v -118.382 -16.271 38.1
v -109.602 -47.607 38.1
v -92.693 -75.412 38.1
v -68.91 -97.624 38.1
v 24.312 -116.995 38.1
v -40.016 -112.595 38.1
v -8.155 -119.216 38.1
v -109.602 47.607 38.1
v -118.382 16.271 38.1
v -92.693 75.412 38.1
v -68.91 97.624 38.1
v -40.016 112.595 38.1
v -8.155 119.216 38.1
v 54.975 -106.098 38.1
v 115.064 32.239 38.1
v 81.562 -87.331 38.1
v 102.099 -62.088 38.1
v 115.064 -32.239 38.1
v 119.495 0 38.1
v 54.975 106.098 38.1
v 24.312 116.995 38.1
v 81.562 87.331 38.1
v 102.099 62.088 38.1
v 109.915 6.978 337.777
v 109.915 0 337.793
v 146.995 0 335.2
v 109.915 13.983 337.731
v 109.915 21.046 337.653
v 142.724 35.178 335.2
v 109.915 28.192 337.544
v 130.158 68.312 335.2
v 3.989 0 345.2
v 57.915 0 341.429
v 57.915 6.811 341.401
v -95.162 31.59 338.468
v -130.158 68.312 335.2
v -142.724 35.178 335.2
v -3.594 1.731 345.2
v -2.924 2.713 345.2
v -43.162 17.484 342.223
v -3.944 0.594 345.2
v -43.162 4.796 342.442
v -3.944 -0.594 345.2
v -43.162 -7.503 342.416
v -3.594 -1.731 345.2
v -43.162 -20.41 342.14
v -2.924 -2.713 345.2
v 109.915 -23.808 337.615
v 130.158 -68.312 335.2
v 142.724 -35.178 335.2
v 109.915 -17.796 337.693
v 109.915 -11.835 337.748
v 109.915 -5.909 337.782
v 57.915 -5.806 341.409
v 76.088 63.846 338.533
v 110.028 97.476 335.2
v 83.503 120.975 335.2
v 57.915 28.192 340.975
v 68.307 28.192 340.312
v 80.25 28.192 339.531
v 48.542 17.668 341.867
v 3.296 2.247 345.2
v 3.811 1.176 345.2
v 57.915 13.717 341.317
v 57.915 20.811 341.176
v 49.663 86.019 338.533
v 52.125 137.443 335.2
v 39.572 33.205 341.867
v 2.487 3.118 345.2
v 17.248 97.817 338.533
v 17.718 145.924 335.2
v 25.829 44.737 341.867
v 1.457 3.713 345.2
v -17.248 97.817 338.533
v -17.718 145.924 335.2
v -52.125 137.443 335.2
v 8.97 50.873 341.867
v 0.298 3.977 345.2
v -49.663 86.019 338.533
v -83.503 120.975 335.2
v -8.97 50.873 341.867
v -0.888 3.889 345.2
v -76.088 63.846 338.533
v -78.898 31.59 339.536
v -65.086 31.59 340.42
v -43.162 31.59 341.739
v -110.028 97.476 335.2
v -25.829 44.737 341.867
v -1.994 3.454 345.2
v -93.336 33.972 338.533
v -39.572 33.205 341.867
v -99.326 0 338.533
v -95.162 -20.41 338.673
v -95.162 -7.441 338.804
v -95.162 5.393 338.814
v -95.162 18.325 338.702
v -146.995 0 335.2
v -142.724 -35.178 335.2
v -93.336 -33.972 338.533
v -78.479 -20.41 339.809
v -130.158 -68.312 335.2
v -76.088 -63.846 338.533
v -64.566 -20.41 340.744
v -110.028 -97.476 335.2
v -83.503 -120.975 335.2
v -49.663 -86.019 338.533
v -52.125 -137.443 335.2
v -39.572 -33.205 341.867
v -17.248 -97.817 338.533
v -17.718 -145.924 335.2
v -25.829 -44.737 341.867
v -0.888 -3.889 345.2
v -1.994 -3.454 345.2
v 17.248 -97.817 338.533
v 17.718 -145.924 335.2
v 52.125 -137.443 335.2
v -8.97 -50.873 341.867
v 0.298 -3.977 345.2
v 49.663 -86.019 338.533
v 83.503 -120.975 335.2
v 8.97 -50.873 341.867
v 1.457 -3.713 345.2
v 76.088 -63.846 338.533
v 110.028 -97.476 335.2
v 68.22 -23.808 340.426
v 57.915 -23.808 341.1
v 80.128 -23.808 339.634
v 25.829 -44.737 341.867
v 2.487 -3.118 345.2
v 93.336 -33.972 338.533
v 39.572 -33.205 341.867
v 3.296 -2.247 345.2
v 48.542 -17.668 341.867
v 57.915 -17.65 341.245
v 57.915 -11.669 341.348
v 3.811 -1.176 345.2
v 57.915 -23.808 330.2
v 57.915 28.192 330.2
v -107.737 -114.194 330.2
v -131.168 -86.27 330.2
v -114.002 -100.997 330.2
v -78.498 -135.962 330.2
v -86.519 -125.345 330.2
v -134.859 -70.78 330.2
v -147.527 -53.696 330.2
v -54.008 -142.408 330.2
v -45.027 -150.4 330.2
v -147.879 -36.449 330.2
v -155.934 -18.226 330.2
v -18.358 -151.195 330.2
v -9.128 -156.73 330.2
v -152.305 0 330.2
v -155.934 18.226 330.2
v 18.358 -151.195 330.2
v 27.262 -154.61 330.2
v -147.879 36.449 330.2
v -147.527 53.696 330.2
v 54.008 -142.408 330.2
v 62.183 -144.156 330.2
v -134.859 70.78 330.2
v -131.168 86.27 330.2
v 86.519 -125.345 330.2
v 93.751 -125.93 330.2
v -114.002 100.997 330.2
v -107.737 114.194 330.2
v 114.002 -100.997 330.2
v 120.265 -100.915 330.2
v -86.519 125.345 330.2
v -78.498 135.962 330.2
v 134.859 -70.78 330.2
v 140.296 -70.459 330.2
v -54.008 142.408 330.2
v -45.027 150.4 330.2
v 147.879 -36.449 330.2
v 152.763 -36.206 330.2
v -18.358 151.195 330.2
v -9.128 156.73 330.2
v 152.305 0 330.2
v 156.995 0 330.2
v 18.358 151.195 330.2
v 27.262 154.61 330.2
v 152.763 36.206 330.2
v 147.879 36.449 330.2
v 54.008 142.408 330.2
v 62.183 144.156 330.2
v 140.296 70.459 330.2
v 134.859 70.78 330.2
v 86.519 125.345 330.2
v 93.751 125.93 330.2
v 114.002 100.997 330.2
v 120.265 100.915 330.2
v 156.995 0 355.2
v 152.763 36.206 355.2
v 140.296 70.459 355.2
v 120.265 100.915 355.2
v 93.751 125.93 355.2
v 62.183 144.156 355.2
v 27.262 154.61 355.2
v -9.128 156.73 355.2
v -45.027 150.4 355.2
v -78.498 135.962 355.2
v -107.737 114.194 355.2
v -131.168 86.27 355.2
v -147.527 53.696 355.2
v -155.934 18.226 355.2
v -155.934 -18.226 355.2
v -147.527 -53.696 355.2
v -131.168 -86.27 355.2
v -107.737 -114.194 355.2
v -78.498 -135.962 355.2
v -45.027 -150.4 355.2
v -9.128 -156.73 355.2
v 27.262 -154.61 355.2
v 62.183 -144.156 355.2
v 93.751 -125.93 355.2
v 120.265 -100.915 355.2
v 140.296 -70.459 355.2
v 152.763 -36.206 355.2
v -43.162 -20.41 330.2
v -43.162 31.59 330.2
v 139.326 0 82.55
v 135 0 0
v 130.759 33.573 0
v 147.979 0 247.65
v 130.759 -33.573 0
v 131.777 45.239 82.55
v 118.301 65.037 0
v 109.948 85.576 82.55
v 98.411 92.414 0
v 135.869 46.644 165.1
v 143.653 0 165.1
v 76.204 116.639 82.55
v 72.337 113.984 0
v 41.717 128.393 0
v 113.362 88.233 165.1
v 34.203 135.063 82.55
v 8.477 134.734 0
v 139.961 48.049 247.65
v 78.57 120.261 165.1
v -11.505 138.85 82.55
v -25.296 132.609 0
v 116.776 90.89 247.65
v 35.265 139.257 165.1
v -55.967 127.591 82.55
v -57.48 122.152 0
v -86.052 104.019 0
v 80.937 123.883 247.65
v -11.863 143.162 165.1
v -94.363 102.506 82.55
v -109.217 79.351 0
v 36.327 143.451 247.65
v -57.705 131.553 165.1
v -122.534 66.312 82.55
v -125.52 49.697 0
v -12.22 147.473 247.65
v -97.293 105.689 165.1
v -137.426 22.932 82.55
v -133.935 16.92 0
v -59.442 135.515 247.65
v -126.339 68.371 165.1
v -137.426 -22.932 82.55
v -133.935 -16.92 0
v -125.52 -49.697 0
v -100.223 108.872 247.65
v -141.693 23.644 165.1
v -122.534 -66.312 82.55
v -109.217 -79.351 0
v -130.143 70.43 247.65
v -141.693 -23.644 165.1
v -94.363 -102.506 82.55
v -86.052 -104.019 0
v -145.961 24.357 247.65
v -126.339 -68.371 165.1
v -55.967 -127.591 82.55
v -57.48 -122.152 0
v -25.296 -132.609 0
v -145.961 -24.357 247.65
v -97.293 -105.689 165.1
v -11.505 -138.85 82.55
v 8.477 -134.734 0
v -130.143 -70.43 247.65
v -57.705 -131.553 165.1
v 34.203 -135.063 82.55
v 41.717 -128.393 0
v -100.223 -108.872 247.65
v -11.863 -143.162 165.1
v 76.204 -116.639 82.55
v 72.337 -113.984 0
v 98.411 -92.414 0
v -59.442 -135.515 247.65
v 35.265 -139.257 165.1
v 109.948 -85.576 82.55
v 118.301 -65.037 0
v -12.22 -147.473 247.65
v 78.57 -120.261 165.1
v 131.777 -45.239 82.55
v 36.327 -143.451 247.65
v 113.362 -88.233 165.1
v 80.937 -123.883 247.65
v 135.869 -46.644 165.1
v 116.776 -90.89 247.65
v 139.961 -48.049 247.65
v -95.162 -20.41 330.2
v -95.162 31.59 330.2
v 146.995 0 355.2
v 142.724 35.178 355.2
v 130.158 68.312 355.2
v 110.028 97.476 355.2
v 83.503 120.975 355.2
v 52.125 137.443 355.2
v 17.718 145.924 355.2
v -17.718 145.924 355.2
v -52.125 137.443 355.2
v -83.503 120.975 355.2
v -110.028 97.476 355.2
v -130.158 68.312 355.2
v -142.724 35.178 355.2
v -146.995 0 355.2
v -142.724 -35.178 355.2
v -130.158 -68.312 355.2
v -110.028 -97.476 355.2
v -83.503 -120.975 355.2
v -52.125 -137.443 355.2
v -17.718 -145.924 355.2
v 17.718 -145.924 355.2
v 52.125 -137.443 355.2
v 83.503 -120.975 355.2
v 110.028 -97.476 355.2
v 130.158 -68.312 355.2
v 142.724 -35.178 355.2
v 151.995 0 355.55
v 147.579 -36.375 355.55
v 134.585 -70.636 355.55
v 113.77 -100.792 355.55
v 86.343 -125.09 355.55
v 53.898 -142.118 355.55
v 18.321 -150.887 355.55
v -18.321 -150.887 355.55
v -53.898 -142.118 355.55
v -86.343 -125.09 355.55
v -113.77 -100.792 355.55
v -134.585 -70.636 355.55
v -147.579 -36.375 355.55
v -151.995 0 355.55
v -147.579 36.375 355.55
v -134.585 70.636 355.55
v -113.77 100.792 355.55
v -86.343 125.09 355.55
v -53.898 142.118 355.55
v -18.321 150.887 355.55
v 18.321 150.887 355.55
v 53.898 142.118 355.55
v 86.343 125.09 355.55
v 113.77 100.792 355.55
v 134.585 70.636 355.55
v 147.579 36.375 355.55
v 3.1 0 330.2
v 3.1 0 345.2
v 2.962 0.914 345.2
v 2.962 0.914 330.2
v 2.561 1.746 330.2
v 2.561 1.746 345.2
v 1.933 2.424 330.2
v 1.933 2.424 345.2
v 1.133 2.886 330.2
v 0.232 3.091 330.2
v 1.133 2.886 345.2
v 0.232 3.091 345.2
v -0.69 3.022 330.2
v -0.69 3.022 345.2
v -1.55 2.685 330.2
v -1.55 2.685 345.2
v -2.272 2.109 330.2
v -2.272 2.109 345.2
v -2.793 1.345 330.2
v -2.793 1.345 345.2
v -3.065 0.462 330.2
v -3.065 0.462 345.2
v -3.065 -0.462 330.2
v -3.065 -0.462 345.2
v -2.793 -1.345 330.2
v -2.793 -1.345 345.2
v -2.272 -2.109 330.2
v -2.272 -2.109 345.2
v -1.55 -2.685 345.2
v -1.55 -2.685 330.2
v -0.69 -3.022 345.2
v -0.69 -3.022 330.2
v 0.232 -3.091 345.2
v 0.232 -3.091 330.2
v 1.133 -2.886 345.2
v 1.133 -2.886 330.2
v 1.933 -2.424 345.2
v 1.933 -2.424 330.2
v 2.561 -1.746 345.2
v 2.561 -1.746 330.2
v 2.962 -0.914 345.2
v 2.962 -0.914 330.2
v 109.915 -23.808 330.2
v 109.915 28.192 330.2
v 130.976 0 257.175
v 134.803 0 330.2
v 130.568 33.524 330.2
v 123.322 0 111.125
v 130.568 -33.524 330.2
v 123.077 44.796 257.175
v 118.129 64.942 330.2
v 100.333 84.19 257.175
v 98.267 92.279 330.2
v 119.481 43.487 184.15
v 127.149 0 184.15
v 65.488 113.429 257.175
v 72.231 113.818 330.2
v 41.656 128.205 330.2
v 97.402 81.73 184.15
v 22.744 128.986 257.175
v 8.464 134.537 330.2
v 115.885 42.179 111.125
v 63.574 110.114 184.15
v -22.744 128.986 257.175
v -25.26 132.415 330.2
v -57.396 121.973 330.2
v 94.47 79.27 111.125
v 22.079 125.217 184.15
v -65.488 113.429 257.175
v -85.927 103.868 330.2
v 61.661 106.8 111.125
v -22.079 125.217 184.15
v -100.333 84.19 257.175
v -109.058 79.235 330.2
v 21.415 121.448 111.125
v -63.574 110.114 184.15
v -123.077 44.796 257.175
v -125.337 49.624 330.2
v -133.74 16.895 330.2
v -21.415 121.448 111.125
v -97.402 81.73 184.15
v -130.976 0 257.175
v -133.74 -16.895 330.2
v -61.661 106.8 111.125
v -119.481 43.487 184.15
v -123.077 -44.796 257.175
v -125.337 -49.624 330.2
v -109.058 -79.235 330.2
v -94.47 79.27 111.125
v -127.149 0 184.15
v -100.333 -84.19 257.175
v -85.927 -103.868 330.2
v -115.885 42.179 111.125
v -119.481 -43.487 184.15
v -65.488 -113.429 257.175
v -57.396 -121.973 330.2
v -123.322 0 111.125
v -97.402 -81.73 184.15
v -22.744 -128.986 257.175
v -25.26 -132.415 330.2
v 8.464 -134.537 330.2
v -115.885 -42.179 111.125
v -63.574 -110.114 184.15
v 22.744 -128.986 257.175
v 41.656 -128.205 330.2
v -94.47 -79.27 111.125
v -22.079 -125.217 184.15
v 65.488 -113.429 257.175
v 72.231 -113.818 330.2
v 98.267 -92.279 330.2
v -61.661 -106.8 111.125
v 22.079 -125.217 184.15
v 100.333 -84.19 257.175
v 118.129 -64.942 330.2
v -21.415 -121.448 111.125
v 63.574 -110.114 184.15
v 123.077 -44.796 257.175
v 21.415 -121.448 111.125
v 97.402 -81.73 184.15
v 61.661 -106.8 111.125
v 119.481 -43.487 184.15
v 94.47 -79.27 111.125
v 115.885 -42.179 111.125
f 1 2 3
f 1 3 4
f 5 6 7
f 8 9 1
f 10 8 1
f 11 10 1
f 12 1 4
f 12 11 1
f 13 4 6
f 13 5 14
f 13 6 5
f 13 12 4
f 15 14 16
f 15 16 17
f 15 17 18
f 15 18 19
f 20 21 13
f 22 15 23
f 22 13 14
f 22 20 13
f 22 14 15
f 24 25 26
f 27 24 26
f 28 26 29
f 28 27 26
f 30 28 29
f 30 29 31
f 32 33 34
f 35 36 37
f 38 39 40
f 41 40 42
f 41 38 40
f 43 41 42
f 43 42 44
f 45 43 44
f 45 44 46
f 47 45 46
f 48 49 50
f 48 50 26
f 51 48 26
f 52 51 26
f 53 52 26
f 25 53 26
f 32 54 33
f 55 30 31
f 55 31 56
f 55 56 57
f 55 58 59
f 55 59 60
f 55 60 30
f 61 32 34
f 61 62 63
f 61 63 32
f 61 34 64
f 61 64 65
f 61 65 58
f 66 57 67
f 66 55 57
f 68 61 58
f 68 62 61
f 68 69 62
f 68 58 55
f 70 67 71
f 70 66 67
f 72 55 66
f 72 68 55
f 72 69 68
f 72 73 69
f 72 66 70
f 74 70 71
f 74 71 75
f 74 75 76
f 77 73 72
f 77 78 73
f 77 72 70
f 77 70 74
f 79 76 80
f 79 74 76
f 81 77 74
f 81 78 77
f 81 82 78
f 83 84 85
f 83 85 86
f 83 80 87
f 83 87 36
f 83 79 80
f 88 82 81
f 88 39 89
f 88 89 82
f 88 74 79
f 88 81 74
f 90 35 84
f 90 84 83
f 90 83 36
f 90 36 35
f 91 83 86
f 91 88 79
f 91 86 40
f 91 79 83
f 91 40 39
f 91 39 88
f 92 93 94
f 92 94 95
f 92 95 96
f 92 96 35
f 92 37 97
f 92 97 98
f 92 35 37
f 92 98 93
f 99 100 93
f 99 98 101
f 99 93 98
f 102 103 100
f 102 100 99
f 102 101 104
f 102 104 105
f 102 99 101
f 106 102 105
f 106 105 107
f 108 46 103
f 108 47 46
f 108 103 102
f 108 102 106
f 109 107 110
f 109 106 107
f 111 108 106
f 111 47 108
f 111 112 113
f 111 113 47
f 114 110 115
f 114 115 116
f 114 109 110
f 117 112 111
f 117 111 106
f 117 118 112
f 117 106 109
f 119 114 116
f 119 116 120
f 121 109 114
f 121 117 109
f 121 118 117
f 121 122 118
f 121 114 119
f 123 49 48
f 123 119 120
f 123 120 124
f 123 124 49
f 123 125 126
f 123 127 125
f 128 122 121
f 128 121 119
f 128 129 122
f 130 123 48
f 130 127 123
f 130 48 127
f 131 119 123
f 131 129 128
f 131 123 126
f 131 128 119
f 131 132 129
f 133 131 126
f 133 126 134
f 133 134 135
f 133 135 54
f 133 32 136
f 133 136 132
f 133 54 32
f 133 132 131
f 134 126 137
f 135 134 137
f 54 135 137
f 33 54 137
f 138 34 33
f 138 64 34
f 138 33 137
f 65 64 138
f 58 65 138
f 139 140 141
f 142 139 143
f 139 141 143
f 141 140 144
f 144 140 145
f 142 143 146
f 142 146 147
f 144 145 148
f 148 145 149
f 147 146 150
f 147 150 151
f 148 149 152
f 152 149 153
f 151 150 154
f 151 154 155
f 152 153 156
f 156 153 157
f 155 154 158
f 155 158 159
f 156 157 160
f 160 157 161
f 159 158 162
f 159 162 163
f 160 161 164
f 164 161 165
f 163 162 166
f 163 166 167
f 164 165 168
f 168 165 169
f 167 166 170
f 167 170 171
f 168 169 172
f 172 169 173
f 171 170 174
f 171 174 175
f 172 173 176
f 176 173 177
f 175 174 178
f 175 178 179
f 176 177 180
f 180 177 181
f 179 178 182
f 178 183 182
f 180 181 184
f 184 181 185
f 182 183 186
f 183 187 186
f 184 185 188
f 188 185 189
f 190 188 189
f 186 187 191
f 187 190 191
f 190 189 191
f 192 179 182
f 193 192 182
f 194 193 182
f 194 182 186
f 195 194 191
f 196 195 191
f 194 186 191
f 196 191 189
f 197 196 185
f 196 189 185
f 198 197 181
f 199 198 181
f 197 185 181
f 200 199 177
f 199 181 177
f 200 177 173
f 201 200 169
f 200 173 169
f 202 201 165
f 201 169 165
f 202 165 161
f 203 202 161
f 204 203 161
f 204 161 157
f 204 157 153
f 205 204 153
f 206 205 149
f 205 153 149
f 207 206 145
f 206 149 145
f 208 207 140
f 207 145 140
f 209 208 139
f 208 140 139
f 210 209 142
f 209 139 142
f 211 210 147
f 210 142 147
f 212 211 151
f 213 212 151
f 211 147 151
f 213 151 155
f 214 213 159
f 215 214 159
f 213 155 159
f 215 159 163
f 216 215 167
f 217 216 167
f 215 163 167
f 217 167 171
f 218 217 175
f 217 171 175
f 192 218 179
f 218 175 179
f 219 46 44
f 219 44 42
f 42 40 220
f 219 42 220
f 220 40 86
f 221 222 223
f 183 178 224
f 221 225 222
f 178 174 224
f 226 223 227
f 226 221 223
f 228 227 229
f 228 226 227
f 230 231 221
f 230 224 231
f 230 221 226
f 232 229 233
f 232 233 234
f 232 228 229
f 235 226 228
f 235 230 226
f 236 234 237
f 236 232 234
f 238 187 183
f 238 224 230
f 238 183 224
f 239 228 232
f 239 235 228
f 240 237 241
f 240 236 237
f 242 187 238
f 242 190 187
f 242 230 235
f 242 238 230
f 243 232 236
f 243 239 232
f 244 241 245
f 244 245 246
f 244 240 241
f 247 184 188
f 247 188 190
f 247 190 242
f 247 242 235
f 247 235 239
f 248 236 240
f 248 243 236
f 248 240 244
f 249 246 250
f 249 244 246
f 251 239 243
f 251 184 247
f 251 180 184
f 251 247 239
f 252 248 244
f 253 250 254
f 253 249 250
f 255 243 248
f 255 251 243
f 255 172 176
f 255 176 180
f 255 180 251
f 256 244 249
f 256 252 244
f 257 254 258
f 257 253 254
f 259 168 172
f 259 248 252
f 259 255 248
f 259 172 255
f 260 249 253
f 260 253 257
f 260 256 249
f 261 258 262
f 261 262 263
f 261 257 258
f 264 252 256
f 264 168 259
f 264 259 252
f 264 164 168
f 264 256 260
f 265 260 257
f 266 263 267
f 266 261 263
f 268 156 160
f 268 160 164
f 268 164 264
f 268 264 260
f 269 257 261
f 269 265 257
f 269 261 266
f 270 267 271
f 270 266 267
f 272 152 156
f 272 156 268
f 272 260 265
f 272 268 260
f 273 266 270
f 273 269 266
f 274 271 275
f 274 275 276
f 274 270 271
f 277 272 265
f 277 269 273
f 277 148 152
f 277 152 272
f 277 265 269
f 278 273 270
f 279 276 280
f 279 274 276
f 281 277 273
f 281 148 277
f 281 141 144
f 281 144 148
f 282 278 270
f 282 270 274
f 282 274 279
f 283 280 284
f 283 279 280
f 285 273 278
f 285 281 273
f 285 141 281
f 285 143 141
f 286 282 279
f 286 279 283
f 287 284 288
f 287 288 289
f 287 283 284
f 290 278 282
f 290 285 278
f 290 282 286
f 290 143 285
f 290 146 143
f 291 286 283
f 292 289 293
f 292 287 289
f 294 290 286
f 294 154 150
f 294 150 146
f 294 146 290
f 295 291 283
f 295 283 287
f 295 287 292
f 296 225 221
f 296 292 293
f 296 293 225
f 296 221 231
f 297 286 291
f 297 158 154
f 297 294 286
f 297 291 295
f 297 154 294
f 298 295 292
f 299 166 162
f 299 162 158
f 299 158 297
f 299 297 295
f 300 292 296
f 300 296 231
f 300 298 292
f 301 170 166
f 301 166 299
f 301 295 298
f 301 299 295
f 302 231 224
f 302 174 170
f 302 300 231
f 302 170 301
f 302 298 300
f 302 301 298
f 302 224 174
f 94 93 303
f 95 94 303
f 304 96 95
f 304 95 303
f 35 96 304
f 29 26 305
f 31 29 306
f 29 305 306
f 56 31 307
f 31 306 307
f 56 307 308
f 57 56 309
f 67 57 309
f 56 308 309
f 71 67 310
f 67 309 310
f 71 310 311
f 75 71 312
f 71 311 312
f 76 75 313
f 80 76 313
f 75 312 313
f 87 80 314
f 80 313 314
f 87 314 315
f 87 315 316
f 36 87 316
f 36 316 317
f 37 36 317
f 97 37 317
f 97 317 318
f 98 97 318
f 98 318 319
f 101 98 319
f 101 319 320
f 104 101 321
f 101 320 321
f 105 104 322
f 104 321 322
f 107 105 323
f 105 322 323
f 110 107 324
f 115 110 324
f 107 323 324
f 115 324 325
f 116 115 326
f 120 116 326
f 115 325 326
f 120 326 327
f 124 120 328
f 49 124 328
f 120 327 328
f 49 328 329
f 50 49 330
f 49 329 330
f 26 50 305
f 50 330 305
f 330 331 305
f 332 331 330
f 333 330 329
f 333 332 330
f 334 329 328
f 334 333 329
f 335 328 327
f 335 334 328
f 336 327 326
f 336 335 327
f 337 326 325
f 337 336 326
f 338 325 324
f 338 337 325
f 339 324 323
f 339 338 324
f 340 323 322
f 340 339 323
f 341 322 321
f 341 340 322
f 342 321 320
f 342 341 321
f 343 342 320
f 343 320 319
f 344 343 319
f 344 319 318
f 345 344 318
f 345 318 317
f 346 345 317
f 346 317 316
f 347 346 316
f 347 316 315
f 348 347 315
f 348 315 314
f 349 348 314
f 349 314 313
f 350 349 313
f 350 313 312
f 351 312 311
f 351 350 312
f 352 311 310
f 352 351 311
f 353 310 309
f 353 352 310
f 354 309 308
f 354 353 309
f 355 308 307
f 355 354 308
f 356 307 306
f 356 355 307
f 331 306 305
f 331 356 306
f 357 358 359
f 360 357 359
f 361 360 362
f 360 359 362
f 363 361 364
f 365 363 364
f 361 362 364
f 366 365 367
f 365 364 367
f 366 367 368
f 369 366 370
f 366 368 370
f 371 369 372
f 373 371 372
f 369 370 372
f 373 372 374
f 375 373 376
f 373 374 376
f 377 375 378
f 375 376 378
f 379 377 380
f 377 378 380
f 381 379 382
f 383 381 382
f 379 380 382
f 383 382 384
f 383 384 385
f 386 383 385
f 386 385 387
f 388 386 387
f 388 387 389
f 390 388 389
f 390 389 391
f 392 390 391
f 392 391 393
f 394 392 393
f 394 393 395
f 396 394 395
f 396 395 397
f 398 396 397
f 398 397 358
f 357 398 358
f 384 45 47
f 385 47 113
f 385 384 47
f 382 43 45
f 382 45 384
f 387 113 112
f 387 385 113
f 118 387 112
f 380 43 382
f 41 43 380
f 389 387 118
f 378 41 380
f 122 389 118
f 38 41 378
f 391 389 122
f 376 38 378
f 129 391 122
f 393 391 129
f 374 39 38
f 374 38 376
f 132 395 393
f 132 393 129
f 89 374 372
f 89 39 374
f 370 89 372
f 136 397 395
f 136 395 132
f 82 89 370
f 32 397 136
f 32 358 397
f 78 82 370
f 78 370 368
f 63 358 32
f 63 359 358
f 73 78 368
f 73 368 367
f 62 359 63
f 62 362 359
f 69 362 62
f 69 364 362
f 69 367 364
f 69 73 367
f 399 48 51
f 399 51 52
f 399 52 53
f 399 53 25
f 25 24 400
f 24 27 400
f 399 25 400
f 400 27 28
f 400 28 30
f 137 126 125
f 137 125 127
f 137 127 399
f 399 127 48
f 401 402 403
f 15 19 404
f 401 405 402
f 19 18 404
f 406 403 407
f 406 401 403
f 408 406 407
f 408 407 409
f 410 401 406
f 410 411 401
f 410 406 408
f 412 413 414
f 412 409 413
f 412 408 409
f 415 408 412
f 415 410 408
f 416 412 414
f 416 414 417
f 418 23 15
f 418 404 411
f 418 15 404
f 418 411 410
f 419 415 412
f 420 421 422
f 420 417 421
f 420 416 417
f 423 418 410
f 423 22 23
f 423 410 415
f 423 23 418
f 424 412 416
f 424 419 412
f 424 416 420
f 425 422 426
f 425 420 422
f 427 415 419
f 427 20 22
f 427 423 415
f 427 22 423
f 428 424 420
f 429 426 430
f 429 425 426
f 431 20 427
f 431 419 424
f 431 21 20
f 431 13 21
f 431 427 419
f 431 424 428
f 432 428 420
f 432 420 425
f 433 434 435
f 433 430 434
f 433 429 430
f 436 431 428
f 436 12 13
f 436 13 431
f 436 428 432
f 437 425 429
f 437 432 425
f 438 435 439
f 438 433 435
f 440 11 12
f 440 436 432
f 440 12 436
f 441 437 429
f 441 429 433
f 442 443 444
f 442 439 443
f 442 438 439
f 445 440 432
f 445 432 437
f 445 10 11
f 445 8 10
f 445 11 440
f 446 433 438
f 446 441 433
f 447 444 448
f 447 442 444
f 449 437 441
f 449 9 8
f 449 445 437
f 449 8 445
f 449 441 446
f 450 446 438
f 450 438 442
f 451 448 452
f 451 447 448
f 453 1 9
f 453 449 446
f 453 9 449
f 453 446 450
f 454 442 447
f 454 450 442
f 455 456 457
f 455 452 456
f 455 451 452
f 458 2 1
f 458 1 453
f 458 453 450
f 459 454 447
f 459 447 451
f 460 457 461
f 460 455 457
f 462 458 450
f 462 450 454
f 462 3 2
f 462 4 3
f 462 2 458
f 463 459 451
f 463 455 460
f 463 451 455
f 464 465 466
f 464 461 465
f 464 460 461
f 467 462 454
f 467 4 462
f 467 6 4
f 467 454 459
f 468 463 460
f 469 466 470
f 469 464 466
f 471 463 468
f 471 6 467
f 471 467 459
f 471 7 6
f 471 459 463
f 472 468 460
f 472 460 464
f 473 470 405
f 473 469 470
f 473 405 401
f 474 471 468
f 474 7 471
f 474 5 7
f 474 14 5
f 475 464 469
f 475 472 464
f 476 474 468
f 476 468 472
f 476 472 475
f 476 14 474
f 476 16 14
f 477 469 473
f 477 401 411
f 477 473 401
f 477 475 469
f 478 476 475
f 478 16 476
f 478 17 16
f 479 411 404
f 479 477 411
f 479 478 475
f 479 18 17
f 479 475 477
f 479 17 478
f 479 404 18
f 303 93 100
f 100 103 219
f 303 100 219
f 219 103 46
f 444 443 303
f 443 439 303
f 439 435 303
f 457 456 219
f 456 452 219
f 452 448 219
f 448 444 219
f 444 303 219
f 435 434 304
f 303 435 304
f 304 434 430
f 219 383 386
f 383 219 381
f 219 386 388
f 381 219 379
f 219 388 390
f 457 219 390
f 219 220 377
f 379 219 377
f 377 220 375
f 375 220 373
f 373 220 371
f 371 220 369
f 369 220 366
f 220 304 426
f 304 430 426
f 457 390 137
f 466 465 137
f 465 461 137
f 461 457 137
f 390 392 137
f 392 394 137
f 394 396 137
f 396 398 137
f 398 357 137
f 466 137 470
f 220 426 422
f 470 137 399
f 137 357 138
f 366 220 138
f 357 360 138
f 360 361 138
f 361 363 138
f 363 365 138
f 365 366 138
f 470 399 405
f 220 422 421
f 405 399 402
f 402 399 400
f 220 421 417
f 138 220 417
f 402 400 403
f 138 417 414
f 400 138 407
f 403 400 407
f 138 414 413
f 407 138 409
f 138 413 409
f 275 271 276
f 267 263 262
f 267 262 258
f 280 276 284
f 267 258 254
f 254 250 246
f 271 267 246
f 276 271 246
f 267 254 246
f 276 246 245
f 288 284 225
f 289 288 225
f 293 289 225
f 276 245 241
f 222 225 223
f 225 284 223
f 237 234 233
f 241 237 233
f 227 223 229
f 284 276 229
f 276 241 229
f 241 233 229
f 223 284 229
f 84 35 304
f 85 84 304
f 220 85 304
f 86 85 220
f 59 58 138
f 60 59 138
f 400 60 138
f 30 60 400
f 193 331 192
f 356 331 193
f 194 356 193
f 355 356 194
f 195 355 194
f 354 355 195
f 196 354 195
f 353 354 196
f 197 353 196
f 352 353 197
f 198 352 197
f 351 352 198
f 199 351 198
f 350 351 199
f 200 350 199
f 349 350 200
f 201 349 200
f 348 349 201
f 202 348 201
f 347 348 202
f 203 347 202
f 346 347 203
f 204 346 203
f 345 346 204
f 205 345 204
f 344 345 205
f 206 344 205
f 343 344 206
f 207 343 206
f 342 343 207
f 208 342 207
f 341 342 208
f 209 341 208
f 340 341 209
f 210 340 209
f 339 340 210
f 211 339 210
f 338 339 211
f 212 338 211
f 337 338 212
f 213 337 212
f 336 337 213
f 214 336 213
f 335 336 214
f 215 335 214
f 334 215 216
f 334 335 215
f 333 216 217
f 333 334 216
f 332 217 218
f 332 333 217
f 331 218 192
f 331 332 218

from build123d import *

# Parameters (mm, degrees)
F0_R         = 135
F1_DEPTH     = 330.2
F1_TAPER     = -3
F2_R         = 134.8030624247
F3_DEPTH     = 292.1
F3_TAPER     = 3
F4_R         = 156.9952990324
F5_DEPTH     = 25
F6_R         = 146.995306015
F6_W         = 52
F6_H         = 52
F6_R_2       = 3.1
F7_DEPTH     = 20
F7_FACE_R    = 146.995306015
F7_FACE1_R   = 156.9952990324
F7_FACE1_R_2 = 146.995306015
F8_DEPTH     = 10
F8_TAPER     = 86
F9_DEPTH     = 254


with BuildPart() as f1:
    # F0 (on Top) → F1 (new body)
    with BuildSketch(Plane.XY):
        Circle(F0_R)
    extrude(amount=F1_DEPTH, taper=F1_TAPER)

    # F2 (on face) → F3 (cut)
    with BuildSketch(Plane.XY.offset(330.2)):
        Circle(F2_R)
    extrude(amount=-F3_DEPTH, taper=F3_TAPER, mode=Mode.SUBTRACT)

    # F4 (on face) → F5 (join)
    with BuildSketch(Plane.XY.offset(330.2)):
        Circle(F4_R)
    extrude(amount=F5_DEPTH)

    # F6 (on face) → F7 (cut)
    with BuildSketch(Plane.XY.offset(355.2)):
        Circle(F6_R)
        with Locations((-69.1615422964, 5.5897118747)):
            Rectangle(F6_W, F6_H, mode=Mode.SUBTRACT)
        Circle(F6_R_2, mode=Mode.SUBTRACT)
        with Locations((83.9149872065, 2.1923439801)):
            Rectangle(F6_W, F6_H, mode=Mode.SUBTRACT)
        with Locations((83.9149872065, 2.1923439801)):
            Rectangle(F6_W, F6_H)
        with Locations((-69.1615422964, 5.5897118747)):
            Rectangle(F6_W, F6_H)
        Circle(F6_R_2)
    extrude(amount=-F7_DEPTH, mode=Mode.SUBTRACT)

    # F7_face (on face) + F7_face1 (on face) → F8 (join)
    with BuildSketch(Plane.XY.offset(335.2)):
        Circle(F7_FACE_R)
    with BuildSketch(Plane.XY.offset(355.2)):
        Circle(F7_FACE1_R)
        Circle(F7_FACE1_R_2, mode=Mode.SUBTRACT)
    extrude(amount=F8_DEPTH, taper=F8_TAPER)

    # F6 (on face) → F9 (cut)
    with BuildSketch(Plane.XY.offset(355.2)):
        with Locations((83.9149872065, 2.1923439801)):
            Rectangle(F6_W, F6_H)
        with Locations((-69.1615422964, 5.5897118747)):
            Rectangle(F6_W, F6_H)
        Circle(F6_R_2)
    extrude(amount=-F9_DEPTH, mode=Mode.SUBTRACT)


solid = f1.part
